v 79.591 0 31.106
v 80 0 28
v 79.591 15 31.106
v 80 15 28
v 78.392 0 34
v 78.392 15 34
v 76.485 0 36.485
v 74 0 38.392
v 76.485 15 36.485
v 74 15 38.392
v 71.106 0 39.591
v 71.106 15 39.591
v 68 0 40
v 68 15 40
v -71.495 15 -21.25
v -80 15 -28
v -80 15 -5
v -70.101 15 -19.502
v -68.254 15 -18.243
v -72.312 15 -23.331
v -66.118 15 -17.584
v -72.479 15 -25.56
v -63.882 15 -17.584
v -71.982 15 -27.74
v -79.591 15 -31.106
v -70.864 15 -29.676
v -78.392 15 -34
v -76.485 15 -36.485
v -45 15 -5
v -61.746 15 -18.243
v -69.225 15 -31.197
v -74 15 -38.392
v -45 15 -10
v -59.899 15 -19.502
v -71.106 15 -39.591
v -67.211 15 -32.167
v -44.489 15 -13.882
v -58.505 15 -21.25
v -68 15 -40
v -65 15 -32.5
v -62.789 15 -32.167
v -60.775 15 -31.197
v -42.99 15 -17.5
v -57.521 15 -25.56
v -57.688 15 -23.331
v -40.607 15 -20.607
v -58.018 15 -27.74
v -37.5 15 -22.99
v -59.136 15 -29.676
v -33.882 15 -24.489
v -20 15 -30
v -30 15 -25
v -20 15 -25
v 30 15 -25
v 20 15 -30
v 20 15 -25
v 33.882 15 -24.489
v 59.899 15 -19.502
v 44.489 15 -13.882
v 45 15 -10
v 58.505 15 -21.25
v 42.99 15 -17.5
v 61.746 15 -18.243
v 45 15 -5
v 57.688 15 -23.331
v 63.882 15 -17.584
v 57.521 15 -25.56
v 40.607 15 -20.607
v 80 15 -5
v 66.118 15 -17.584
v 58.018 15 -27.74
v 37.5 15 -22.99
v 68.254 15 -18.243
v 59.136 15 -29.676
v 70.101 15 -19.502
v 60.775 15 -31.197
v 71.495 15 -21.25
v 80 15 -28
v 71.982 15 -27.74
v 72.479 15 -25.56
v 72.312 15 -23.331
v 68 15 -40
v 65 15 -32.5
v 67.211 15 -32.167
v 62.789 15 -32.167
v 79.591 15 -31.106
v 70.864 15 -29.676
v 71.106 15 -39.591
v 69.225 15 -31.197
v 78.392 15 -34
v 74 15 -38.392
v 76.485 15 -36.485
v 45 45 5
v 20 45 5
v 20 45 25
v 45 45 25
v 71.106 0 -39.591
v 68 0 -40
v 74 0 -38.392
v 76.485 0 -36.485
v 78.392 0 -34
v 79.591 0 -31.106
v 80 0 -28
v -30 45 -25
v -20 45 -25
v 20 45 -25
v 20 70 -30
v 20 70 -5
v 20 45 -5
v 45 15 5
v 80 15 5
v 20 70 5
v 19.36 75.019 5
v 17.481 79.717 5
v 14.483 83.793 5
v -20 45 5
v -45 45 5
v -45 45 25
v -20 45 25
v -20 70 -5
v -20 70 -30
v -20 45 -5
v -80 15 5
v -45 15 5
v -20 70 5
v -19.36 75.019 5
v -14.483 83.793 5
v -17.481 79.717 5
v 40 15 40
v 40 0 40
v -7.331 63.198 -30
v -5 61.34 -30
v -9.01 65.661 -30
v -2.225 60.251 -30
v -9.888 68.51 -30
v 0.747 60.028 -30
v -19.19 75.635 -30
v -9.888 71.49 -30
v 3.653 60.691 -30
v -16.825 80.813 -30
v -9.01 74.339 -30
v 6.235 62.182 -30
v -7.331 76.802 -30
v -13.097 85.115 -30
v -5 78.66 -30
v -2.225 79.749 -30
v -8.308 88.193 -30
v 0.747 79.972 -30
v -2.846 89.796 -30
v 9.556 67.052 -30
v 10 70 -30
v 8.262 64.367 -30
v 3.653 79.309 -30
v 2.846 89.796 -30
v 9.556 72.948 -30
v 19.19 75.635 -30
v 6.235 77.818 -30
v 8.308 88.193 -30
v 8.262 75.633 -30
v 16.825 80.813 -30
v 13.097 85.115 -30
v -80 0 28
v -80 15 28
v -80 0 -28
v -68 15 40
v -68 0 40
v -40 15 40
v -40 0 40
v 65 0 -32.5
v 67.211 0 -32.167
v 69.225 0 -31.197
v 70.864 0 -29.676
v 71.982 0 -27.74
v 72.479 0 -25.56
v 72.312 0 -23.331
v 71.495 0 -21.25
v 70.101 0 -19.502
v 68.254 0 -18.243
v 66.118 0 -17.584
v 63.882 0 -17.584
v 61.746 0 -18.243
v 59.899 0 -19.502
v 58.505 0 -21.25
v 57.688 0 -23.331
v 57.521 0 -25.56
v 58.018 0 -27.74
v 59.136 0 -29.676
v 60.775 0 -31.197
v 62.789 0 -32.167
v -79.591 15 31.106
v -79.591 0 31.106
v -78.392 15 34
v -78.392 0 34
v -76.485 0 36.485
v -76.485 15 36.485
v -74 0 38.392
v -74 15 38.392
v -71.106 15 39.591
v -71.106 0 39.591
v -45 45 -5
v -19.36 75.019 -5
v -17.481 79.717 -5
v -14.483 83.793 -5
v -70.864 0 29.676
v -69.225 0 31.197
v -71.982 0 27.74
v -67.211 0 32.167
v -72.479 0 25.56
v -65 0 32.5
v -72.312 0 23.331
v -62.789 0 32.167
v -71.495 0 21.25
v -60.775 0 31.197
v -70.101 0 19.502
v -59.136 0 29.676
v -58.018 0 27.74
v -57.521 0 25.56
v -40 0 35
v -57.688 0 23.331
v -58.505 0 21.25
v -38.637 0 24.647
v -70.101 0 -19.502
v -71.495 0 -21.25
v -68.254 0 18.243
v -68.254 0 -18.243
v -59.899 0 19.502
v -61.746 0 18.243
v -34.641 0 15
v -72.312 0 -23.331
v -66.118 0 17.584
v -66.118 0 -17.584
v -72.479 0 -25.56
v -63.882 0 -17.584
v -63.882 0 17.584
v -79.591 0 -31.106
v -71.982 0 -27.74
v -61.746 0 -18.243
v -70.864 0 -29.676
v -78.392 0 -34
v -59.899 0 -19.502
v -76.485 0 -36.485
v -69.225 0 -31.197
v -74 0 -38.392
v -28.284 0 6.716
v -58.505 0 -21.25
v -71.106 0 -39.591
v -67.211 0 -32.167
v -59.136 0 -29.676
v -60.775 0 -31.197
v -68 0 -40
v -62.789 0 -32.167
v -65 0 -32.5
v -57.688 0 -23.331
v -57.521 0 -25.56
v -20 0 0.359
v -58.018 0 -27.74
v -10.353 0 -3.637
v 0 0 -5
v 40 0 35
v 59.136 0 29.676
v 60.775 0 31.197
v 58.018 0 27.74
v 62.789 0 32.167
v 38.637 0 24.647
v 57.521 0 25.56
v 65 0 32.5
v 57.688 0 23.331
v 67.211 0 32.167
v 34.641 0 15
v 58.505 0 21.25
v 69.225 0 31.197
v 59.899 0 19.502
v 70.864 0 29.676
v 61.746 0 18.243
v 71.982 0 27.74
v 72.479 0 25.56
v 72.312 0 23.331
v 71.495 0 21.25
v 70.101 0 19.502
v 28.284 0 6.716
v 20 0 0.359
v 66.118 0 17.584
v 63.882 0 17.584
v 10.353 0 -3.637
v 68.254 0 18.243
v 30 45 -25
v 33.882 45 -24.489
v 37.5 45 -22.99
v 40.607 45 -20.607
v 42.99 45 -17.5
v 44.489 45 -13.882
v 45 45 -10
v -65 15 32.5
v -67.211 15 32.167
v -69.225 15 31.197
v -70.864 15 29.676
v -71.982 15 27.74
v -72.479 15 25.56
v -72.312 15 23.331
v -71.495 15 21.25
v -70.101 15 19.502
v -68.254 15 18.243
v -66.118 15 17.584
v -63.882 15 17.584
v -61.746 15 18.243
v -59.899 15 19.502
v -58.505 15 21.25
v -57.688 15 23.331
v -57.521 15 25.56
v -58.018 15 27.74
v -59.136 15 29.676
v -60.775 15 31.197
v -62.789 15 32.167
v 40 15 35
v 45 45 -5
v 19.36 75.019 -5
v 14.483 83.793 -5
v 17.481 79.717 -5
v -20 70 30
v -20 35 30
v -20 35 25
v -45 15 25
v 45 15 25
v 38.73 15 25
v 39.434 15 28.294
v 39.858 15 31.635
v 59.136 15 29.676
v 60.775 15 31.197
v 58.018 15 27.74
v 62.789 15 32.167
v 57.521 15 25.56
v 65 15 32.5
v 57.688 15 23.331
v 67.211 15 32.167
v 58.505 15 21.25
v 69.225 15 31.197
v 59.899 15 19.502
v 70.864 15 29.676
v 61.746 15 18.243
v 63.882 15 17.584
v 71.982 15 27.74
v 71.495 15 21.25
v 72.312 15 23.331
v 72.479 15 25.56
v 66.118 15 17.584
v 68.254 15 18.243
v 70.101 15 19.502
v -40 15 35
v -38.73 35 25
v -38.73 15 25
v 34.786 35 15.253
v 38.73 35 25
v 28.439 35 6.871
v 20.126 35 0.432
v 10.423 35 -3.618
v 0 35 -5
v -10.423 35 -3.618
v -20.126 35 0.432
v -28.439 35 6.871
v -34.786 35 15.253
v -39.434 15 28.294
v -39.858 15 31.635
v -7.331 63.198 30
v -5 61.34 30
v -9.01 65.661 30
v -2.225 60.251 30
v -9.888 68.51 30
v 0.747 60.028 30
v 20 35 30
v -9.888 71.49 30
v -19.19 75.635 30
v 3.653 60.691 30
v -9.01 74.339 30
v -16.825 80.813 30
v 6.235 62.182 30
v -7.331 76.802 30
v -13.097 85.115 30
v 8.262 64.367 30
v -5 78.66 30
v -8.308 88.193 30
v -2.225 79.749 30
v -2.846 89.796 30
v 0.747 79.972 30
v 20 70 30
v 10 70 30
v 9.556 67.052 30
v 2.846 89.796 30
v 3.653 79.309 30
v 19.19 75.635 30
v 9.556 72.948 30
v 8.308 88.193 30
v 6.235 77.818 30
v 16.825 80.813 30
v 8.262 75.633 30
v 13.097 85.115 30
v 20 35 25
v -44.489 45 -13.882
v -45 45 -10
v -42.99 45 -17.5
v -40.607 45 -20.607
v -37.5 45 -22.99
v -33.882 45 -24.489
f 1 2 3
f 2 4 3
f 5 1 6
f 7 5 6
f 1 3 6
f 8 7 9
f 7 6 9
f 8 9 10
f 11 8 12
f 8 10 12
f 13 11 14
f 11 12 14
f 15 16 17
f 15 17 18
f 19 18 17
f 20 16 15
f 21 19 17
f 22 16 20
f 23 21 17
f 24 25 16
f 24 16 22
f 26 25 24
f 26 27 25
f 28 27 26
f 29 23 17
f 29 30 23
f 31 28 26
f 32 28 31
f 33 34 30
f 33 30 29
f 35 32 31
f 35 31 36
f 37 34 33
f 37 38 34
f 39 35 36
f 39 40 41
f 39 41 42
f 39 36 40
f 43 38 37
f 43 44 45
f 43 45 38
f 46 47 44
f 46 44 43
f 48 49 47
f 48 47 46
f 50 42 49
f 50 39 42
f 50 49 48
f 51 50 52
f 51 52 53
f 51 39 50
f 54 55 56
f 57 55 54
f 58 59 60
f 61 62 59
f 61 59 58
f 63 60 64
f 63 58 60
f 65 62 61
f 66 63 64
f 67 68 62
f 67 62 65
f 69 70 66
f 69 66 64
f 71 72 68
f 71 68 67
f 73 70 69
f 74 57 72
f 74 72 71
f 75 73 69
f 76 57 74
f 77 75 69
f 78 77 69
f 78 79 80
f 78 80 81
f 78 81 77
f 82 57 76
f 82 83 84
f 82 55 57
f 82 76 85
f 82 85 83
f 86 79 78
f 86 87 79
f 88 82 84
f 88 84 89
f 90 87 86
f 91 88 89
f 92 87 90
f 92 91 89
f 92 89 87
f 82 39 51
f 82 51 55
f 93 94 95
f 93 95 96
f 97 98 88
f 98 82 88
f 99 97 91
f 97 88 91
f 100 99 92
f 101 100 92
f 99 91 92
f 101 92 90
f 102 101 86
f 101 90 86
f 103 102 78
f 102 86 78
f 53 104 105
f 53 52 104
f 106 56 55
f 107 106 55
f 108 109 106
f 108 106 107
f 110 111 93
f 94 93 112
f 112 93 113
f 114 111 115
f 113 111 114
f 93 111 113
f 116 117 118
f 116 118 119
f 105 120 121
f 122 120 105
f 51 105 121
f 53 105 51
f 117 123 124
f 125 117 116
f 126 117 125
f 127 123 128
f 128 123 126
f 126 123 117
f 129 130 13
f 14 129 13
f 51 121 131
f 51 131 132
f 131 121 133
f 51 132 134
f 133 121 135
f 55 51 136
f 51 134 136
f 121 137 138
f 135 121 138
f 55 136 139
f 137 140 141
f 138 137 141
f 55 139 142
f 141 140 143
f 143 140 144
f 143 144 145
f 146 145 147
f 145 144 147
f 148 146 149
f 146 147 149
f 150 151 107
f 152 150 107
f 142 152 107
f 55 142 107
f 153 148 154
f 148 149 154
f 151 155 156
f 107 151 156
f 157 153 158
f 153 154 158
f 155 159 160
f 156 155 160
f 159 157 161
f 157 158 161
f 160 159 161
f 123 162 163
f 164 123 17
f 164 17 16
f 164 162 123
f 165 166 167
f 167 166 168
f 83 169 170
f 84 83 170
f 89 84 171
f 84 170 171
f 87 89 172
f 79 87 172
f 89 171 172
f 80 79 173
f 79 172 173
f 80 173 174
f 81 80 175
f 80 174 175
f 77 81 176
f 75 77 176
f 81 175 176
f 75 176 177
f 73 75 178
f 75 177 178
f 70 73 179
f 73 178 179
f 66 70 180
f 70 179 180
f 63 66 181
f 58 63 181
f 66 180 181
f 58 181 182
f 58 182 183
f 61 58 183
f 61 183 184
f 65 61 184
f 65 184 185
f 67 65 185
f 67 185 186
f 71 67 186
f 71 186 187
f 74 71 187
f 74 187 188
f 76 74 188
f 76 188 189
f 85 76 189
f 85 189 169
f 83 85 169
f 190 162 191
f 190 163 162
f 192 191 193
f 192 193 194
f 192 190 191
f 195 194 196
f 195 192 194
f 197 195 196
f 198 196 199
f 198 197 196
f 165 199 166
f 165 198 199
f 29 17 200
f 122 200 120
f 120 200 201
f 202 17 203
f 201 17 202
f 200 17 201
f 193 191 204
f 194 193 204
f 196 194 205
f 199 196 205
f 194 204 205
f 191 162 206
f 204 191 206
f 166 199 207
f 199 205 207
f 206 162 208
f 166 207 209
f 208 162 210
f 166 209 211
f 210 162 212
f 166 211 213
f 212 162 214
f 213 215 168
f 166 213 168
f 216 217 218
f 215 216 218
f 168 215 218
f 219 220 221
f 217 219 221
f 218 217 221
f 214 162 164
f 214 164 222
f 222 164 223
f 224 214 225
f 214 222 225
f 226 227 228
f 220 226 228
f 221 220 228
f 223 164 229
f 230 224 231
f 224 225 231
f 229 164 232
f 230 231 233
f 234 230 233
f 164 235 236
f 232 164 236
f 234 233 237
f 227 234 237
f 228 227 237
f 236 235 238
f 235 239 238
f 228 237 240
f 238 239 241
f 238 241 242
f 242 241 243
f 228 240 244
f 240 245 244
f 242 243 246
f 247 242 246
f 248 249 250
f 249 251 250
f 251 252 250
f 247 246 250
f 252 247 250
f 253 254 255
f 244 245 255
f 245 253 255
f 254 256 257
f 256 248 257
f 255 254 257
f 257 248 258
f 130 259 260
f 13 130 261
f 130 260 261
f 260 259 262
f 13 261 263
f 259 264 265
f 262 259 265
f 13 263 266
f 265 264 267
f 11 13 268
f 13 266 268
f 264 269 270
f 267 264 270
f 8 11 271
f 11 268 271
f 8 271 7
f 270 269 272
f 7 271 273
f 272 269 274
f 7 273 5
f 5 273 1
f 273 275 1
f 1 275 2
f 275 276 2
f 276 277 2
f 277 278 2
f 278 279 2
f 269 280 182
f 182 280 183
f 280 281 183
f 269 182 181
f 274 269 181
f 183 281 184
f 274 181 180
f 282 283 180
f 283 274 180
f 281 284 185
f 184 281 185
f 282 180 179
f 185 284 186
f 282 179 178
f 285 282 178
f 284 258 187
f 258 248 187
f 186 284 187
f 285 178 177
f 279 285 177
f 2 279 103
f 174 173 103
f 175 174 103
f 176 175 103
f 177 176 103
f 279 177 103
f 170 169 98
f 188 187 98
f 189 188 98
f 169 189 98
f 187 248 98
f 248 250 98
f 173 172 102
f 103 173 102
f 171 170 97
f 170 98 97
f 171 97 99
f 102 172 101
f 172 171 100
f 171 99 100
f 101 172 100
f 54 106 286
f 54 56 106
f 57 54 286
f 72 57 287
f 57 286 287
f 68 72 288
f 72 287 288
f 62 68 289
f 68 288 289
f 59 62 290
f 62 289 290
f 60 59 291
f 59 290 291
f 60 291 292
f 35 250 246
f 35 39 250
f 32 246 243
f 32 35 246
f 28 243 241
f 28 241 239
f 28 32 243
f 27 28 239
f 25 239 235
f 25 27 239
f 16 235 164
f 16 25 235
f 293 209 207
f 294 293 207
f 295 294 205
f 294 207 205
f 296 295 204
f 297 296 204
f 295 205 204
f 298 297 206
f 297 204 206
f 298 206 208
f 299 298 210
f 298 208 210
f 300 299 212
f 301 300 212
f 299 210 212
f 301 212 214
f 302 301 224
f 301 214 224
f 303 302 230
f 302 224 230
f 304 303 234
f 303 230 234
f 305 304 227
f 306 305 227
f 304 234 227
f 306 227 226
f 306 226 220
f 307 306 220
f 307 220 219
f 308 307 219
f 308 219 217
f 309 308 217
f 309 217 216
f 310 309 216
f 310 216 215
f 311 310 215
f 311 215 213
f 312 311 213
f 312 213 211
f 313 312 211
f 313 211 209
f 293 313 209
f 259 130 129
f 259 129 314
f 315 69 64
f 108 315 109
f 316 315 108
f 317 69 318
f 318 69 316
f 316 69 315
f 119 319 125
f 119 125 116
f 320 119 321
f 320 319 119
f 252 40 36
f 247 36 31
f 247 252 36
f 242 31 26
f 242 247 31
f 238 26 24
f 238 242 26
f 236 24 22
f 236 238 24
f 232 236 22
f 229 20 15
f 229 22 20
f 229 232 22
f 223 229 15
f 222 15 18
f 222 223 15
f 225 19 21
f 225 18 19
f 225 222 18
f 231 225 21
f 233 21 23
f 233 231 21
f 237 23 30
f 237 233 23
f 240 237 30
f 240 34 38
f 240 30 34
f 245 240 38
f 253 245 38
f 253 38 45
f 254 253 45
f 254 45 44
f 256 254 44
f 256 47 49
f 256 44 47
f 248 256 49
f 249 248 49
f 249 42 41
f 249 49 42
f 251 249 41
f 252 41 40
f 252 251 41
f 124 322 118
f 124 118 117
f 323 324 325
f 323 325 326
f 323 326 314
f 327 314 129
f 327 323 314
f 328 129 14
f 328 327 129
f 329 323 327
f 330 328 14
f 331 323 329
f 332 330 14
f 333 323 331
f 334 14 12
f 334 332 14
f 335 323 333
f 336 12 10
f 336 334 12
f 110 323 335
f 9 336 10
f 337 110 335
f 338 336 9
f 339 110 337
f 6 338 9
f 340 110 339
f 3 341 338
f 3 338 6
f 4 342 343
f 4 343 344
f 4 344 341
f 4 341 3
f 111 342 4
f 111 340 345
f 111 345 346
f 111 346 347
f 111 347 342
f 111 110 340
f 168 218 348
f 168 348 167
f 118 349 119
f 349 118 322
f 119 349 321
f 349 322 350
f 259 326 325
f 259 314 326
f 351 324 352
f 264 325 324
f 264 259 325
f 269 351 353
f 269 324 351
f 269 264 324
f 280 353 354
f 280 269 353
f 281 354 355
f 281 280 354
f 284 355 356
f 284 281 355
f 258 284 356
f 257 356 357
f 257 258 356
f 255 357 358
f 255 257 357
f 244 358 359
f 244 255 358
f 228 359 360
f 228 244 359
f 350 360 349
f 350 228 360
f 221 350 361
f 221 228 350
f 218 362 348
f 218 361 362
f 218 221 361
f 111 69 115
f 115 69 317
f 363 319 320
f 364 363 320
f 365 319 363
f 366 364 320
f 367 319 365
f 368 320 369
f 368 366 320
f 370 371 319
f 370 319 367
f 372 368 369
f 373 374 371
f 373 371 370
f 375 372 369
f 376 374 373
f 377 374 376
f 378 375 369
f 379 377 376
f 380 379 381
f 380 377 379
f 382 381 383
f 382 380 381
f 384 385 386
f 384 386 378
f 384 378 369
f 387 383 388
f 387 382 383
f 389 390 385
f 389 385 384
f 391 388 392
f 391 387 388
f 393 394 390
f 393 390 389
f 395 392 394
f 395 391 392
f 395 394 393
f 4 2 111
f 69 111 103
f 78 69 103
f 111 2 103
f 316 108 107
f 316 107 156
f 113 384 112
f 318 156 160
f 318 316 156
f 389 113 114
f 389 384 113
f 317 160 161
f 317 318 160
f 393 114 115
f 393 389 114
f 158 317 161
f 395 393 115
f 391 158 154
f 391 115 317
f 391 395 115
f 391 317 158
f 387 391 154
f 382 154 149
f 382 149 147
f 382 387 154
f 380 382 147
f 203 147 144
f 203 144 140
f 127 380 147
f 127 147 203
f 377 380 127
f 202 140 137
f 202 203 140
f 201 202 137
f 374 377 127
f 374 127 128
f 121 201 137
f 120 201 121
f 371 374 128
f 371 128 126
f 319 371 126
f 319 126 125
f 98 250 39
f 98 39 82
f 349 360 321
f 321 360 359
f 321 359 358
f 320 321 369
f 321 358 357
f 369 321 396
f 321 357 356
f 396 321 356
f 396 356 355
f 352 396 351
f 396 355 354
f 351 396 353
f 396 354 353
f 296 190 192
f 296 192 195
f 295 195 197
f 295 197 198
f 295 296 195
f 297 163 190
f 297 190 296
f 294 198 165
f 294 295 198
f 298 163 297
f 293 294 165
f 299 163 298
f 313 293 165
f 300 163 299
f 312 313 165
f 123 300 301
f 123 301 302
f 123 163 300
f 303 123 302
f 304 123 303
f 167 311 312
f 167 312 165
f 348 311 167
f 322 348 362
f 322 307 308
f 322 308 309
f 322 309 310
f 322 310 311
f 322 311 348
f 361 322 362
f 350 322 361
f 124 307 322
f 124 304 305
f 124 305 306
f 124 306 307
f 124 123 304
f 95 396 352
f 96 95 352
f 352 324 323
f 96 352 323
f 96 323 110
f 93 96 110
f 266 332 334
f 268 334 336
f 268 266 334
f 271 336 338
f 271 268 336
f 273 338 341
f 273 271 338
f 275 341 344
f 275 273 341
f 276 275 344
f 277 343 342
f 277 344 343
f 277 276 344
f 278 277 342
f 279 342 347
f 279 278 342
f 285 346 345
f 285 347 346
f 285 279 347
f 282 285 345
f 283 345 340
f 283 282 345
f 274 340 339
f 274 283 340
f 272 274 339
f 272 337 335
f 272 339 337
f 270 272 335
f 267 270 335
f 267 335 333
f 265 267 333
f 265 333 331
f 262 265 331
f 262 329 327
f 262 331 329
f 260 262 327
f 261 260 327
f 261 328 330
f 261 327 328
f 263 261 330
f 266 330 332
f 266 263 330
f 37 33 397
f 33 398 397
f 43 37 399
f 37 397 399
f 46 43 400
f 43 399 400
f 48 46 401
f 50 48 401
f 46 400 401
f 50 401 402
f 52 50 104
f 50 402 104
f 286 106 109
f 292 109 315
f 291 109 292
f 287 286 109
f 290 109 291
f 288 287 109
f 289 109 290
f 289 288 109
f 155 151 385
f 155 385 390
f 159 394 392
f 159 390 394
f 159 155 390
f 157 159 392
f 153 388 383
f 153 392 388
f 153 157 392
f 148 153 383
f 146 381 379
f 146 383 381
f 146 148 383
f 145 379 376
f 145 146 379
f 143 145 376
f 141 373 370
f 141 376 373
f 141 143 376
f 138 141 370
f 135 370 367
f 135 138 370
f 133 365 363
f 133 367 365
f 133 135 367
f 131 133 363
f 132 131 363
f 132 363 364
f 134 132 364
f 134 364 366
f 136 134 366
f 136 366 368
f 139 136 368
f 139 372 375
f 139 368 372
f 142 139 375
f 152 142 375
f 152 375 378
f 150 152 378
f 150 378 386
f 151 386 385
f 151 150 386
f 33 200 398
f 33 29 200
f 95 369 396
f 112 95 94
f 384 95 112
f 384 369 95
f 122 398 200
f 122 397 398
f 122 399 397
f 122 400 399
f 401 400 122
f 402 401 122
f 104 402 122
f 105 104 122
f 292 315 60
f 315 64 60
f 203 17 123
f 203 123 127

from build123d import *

# Parameters (mm, degrees)
SKETCH_1_W               = 160
SKETCH_1_H               = 80
EXTRUDE_1_DEPTH          = 15
SKETCH_2_W               = 90
SKETCH_2_H               = 50
EXTRUDE_2_DEPTH          = 45
EXTRUDE_8_DEPTH          = 30
RIB_9_REACH              = 128.886
SKETCH_7_WALL_W          = 350.771540414
SKETCH_7_WALL_H          = 10
CUT_EXTRUDE_1_DEPTH      = 35
SKETCH_10_R              = 7.5
CUT_EXTRUDE_2_DEPTH      = 127.885775405
MIRROR_3_COPY_1_SKETCH_R = 7.5
MIRROR_3_COPY_1_DEPTH    = 127.885775405
FILLET_1_R               = 12
FILLET_2_R               = 12
FILLET_3_R               = 12
FILLET_4_R               = 12
FILLET_5_R               = 15
FILLET_6_R               = 15
CUT_EXTRUDE_3_DEPTH      = 127.885775405
CUT_EXTRUDE_3_DEPTH_BACK = 127.885775405
SKETCH_11_R              = 10


with BuildPart() as part:
    # 草图1 → 凸台-拉伸1 (new body)
    with BuildSketch(Plane(origin=(0, 0, 0), x_dir=(1, 0, 0), z_dir=(0, 1, 0))):
        Rectangle(SKETCH_1_W, SKETCH_1_H)
    extrude(amount=EXTRUDE_1_DEPTH)

    # 草图2 → 凸台-拉伸2 (add)
    with BuildSketch(Plane(origin=(0, 0, 0), x_dir=(1, 0, 0), z_dir=(0, 1, 0))):
        Rectangle(SKETCH_2_W, SKETCH_2_H)
    extrude(amount=EXTRUDE_2_DEPTH)

    # 草图6 → 凸台-拉伸8 (add, symmetric)
    with BuildSketch(Plane.XY):
        with BuildLine():
            Line((0, 15), (20, 15))
            Line((20, 15), (20, 70))
            ThreePointArc((20, 70), (0, 90), (-20, 70))
            Line((-20, 70), (-20, 15))
            Line((-20, 15), (0, 15))
        make_face()
    extrude(amount=EXTRUDE_8_DEPTH, both=True)

    # 草图7 wall → 筋9 (add, up to next)
    with BuildSketch(Plane(origin=(-47.241382895, 49.396547961, 0), x_dir=(0.689655172411, 0.724137931037, 0), z_dir=(-0.724137931037, 0.689655172411, 0)), mode=Mode.PRIVATE) as rib_9_sk1:
        Rectangle(SKETCH_7_WALL_W, SKETCH_7_WALL_H)
    rib_9_tool1 = extrude(rib_9_sk1.sketch, amount=-RIB_9_REACH, mode=Mode.PRIVATE) - part.part
    rib_9 = rib_9_tool1.solids().sort_by_distance((-47.241382895, 49.396547961, 0))[0]
    add(rib_9)

    # 镜向1: 筋9 across plane
    add(rib_9.mirror(Plane(origin=(0, 0, 0), x_dir=(0, 0, 1), z_dir=(1, 0, 0))))

    # 草图8 → 切除-拉伸1 (cut)
    with BuildSketch(Plane(origin=(0, 0, 0), x_dir=(1, 0, 0), z_dir=(0, 1, 0))):
        with BuildLine():
            Line((-40, -40), (40, -40))
            Line((40, -40), (40, -35))
            ThreePointArc((40, -35), (0, 5), (-40, -35))
            Line((-40, -35), (-40, -40))
        make_face()
    extrude(amount=CUT_EXTRUDE_1_DEPTH, mode=Mode.SUBTRACT)

    # 草图10 → 切除-拉伸2 (cut, through all)
    with BuildSketch(Plane(origin=(0, 0, 0), x_dir=(1, 0, 0), z_dir=(0, 1, 0))):
        with Locations(Location((-65, 25, 0), (0, 0, 90))):
            Circle(SKETCH_10_R)
    cut_extrude_2 = extrude(amount=CUT_EXTRUDE_2_DEPTH, mode=Mode.SUBTRACT)

    # 镜向2: 切除-拉伸2 across plane
    add(cut_extrude_2.mirror(Plane(origin=(0, 0, 0), x_dir=(0, 0, 1), z_dir=(1, 0, 0))), mode=Mode.SUBTRACT)

    # 镜向3: 切除-拉伸2 across plane
    add(cut_extrude_2.mirror(Plane.XY), mode=Mode.SUBTRACT)

    # 镜向3 copy 1 sketch → 镜向3 copy 1 (cut, through all)
    with BuildSketch(Plane(origin=(0, 0, 0), x_dir=(-1, 0, 0), z_dir=(0, 1, 0))):
        with Locations(Location((-65, 25, 0), (0, 0, 90))):
            Circle(MIRROR_3_COPY_1_SKETCH_R)
    extrude(amount=MIRROR_3_COPY_1_DEPTH, mode=Mode.SUBTRACT)

    # 圆角1
    fillet_1_edges = [part.edges().sort_by_distance(p)[0] for p in [
        (-80, 7.5, -40),
    ]]
    fillet(fillet_1_edges, radius=FILLET_1_R)

    # 圆角2
    fillet_2_edges = [part.edges().sort_by_distance(p)[0] for p in [
        (80, 7.5, -40),
    ]]
    fillet(fillet_2_edges, radius=FILLET_2_R)

    # 圆角3
    fillet_3_edges = [part.edges().sort_by_distance(p)[0] for p in [
        (-80, 7.5, 40),
    ]]
    fillet(fillet_3_edges, radius=FILLET_3_R)

    # 圆角4
    fillet_4_edges = [part.edges().sort_by_distance(p)[0] for p in [
        (80, 7.5, 40),
    ]]
    fillet(fillet_4_edges, radius=FILLET_4_R)

    # 圆角5
    fillet_5_edges = [part.edges().sort_by_distance(p)[0] for p in [
        (-45, 30, -25),
    ]]
    fillet(fillet_5_edges, radius=FILLET_5_R)

    # 圆角6
    fillet_6_edges = [part.edges().sort_by_distance(p)[0] for p in [
        (45, 30, -25),
    ]]
    fillet(fillet_6_edges, radius=FILLET_6_R)

    # 草图11 → 切除-拉伸3 (cut, two sides: drawn at the far end of the back side and taken through both)
    with BuildSketch(Plane.XY.offset(-CUT_EXTRUDE_3_DEPTH_BACK)):
        with Locations((0, 70)):
            Circle(SKETCH_11_R)
    extrude(amount=CUT_EXTRUDE_3_DEPTH + CUT_EXTRUDE_3_DEPTH_BACK, mode=Mode.SUBTRACT)


solid = part.part
